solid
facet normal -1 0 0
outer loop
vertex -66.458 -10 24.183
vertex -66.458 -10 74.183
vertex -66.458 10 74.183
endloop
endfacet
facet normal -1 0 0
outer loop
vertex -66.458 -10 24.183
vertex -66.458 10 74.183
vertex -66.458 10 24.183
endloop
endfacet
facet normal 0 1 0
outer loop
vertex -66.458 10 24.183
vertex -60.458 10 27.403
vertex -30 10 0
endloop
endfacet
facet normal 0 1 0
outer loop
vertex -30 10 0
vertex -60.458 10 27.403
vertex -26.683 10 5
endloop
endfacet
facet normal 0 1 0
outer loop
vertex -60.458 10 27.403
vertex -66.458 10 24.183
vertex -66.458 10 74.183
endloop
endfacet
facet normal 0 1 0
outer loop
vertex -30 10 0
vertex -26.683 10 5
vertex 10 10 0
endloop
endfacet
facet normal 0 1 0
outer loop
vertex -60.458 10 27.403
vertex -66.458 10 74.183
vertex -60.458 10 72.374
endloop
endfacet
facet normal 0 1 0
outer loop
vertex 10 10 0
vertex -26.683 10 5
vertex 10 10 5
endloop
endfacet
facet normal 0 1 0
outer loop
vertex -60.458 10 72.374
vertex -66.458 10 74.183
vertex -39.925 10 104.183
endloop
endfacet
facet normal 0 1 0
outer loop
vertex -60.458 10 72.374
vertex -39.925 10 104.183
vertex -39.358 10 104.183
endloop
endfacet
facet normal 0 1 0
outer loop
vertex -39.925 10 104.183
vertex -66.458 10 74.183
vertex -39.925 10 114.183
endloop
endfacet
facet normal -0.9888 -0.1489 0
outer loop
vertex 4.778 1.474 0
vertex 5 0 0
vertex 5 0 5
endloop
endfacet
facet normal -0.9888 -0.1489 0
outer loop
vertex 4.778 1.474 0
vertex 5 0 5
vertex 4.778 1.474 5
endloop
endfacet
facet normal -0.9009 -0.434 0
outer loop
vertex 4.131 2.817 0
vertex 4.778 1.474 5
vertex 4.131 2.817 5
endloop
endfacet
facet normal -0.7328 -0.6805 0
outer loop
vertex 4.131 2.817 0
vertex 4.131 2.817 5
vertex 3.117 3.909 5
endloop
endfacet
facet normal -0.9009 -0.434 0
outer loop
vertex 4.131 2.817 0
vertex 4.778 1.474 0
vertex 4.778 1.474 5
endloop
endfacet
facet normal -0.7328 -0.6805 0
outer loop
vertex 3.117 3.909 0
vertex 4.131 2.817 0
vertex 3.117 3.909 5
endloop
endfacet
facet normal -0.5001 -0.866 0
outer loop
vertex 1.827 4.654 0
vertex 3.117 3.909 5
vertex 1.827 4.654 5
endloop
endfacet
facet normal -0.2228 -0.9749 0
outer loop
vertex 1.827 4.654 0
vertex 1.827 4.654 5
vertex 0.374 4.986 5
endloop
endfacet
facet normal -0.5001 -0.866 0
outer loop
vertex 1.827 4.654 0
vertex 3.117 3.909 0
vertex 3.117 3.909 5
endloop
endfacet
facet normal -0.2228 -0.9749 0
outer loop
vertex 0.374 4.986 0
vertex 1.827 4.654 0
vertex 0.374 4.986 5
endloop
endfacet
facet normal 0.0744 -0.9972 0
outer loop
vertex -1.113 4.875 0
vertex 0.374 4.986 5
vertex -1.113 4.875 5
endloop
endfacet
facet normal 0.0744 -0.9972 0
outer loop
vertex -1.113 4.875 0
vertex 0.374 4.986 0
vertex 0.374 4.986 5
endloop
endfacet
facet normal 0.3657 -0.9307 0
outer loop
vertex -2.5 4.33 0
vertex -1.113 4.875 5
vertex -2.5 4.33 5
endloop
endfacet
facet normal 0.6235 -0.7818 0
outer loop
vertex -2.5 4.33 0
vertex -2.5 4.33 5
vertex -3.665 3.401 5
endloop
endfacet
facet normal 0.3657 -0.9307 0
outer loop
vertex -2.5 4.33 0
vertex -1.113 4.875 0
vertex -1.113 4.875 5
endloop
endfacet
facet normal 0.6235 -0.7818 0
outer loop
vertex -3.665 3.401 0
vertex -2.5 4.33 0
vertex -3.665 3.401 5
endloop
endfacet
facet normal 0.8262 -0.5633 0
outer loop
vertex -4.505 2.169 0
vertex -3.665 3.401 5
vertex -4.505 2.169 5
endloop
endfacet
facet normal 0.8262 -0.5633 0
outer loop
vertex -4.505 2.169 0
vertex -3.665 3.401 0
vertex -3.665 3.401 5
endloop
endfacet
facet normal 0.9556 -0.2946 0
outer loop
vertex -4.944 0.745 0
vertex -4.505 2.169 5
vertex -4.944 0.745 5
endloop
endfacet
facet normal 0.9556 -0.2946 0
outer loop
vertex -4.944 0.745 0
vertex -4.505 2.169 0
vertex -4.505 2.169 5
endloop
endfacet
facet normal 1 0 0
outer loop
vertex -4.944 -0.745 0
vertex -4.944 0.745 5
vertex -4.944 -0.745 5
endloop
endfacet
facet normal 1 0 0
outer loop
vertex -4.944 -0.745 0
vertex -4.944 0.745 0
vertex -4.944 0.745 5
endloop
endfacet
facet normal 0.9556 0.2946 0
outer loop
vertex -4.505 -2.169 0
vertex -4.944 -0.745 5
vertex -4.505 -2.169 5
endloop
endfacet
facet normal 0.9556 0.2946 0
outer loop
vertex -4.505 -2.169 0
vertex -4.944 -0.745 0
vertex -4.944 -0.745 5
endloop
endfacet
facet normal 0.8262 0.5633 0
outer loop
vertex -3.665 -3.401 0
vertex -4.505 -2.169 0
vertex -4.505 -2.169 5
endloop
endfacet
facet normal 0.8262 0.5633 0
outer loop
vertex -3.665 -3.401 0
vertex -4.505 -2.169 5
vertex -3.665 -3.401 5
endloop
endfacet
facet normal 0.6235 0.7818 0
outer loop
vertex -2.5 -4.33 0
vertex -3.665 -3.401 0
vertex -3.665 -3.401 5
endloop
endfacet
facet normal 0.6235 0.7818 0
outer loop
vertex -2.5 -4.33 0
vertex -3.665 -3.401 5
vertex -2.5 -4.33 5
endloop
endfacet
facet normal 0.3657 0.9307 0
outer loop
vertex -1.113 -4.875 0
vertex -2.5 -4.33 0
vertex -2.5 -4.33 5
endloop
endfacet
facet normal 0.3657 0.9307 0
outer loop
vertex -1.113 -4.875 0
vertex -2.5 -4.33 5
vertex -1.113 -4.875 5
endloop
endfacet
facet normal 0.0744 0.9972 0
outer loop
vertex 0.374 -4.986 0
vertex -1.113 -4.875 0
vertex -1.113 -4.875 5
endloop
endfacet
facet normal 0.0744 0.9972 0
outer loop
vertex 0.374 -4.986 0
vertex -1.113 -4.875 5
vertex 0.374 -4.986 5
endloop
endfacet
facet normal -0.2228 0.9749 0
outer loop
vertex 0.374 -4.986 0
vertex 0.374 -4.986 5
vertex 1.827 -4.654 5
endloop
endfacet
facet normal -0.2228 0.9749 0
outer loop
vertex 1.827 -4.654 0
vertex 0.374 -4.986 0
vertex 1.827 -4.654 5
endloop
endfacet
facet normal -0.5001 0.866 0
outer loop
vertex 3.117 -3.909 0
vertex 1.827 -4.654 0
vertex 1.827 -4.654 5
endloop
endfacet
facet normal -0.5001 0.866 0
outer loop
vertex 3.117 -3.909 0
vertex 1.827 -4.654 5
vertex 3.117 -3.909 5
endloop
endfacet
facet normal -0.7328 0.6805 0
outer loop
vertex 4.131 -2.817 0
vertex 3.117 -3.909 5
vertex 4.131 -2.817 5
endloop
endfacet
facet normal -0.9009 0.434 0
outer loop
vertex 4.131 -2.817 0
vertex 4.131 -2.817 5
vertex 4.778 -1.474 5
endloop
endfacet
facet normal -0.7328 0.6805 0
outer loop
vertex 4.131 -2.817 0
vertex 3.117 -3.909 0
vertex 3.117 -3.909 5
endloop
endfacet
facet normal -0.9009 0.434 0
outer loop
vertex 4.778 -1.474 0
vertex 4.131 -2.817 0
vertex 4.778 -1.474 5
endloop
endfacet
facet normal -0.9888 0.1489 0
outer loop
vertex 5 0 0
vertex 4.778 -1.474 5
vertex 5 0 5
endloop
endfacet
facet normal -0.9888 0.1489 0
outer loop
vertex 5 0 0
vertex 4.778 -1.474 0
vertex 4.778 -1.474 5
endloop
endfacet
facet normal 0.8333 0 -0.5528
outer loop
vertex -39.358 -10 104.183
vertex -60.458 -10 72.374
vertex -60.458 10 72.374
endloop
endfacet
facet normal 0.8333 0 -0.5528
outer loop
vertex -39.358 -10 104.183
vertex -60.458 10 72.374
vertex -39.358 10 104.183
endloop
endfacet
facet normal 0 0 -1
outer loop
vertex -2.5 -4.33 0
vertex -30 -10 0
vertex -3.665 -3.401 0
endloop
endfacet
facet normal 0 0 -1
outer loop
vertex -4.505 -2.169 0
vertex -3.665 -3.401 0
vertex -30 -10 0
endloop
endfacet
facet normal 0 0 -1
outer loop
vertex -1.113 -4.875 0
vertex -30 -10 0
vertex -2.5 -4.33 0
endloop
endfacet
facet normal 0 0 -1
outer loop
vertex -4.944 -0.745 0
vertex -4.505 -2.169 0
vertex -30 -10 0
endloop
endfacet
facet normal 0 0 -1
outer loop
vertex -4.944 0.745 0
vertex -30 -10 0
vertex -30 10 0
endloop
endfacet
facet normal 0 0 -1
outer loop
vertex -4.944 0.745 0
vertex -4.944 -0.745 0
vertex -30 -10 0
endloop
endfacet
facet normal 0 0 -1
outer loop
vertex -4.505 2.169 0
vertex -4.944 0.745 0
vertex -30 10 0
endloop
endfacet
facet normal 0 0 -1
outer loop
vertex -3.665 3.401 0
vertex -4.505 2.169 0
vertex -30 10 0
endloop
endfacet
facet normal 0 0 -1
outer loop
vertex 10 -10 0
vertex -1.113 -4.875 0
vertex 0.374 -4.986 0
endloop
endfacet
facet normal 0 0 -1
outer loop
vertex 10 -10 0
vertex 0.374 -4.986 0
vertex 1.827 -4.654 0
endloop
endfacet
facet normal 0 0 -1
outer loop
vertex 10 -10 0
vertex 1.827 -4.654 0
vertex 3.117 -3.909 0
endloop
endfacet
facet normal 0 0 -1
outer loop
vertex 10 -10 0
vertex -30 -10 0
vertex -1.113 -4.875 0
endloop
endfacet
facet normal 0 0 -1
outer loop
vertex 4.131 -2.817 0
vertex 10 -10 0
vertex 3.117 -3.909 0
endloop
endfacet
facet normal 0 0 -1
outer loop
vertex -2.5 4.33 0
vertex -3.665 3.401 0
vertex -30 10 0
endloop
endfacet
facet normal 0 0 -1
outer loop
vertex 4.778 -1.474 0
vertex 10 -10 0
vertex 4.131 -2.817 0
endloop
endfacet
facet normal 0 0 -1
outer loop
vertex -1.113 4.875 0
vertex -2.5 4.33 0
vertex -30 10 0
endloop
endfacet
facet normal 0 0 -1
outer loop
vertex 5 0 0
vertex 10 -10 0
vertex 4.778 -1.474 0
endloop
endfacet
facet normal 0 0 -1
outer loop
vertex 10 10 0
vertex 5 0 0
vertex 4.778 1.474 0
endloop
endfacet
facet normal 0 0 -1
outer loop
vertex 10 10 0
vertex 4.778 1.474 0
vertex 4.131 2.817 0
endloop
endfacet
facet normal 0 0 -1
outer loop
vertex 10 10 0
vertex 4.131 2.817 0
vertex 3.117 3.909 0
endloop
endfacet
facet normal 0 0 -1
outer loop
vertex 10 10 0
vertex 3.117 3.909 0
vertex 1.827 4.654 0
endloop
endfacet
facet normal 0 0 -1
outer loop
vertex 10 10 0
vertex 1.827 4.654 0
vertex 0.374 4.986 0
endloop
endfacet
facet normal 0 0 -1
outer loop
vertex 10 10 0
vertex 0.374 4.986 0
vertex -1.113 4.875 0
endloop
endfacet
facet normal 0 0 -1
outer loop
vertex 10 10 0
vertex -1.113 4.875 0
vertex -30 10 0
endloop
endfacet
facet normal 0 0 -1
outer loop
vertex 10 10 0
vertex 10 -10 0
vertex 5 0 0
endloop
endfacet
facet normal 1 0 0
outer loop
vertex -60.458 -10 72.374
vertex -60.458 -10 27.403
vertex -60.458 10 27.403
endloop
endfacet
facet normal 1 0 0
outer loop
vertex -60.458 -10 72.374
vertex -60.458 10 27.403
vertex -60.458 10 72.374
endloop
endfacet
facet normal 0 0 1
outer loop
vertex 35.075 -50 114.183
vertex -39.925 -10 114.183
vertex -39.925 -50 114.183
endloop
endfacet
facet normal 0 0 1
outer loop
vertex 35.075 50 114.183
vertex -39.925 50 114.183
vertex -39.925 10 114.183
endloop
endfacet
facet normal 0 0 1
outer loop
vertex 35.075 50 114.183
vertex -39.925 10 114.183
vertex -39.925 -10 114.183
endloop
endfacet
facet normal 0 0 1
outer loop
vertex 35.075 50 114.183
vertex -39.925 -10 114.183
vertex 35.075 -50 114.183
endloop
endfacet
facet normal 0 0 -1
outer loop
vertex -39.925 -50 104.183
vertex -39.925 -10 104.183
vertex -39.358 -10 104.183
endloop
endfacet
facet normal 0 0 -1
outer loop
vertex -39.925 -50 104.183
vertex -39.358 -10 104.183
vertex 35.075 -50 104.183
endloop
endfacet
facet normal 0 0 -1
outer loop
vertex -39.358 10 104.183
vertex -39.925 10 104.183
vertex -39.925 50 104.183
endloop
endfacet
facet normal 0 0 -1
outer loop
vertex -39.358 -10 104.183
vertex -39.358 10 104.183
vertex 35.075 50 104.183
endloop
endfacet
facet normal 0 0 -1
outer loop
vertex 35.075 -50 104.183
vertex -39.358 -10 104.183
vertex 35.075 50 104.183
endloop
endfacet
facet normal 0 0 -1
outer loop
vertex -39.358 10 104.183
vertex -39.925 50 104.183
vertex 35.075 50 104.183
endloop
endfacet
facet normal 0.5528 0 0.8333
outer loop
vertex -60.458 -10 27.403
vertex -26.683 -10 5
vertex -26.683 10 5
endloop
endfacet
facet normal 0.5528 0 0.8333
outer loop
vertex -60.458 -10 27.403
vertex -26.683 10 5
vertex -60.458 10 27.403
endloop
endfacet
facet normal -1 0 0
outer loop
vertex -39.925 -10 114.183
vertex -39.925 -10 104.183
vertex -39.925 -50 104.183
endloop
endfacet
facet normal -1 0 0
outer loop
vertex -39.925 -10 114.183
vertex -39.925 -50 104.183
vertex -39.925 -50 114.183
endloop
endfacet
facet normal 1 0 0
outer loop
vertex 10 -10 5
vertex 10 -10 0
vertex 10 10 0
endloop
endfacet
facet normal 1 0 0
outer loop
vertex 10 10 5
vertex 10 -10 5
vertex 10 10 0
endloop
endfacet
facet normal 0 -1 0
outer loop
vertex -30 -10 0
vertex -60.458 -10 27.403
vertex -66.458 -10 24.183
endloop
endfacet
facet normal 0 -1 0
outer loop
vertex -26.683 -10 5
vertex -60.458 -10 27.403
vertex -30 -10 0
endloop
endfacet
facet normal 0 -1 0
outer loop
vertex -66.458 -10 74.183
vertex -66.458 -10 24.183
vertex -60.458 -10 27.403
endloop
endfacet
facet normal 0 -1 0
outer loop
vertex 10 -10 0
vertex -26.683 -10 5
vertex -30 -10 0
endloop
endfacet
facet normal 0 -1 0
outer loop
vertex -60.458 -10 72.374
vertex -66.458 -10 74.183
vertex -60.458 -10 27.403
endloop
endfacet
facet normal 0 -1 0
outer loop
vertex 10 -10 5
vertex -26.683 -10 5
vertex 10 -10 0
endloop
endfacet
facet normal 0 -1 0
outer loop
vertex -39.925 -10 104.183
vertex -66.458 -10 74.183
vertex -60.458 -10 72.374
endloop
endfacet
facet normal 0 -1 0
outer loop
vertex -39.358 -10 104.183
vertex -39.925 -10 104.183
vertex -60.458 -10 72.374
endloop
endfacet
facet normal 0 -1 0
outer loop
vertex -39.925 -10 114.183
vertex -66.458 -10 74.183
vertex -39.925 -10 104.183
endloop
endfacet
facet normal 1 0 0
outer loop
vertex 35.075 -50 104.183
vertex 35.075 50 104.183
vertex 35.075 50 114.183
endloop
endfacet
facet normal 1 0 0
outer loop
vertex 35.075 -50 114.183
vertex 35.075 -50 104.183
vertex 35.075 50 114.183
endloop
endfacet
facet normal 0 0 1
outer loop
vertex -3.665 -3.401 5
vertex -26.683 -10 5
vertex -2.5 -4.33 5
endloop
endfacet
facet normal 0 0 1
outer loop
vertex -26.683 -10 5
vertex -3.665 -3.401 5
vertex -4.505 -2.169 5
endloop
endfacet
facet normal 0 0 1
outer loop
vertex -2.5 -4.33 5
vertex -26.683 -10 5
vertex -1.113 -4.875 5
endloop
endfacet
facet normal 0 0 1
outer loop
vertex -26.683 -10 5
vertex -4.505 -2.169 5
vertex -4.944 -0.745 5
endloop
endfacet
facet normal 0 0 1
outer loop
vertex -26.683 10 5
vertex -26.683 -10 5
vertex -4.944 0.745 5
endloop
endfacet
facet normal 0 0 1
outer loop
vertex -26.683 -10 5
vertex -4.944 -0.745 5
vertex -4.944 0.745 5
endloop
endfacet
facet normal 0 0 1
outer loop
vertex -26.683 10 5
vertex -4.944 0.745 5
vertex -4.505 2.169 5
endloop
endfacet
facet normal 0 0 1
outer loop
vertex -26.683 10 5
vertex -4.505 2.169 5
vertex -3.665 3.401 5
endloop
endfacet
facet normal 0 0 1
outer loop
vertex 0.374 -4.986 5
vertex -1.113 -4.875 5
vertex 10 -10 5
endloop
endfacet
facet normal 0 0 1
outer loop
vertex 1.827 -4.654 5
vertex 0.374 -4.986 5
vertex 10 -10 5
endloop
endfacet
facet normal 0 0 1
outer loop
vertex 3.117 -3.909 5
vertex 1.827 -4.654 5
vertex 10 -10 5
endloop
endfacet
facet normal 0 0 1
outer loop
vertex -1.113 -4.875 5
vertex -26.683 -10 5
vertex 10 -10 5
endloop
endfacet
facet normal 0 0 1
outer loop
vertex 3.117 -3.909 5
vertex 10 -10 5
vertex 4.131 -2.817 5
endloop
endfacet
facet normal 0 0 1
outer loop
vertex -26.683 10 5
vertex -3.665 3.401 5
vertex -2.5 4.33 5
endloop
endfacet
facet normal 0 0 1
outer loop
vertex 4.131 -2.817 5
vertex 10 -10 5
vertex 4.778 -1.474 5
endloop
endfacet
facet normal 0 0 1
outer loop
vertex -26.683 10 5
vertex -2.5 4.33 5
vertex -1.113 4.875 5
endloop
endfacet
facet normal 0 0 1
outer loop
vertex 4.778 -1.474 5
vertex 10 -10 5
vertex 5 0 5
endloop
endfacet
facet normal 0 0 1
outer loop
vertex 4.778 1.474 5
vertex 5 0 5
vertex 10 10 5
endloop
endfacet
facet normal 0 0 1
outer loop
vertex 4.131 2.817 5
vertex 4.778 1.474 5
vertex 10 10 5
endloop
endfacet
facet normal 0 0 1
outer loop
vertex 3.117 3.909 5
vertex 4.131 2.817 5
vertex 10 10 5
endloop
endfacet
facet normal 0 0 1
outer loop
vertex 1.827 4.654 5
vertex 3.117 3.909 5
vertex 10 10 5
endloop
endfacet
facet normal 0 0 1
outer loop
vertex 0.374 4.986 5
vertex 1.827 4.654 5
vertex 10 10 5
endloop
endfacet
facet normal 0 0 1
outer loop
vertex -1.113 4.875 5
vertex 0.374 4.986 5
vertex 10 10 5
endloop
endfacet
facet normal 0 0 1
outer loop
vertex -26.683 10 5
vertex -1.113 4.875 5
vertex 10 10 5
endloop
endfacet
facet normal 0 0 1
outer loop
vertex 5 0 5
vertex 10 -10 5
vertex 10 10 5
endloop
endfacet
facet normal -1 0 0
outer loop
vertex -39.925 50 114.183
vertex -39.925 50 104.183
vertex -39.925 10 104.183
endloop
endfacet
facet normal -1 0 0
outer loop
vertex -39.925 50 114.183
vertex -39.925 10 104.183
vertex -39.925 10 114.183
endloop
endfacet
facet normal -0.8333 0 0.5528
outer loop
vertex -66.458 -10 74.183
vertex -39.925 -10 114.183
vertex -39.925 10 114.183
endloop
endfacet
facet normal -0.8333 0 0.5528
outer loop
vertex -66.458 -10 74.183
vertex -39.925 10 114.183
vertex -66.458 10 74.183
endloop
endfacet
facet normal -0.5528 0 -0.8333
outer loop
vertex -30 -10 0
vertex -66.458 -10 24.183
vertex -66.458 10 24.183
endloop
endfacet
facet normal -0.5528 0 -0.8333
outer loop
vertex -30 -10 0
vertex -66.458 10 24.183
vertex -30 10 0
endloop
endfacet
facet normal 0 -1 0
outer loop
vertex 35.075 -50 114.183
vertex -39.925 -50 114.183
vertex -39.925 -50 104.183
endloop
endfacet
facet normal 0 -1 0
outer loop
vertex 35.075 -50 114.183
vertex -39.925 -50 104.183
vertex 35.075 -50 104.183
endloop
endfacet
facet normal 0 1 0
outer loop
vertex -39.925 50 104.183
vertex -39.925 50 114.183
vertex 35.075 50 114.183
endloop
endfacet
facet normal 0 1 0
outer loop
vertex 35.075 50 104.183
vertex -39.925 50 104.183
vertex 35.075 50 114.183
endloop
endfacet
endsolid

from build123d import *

# Parameters (mm, degrees)
SKETCH1_W                = 20
SKETCH1_H                = 20
SKETCH1_R                = 5
BOSS_EXTRUDE1_DEPTH      = 5
SKETCH2_W                = 5
SKETCH2_H                = 20
BOSS_EXTRUDE2_DEPTH      = 20
BOSS_EXTRUDE6_DEPTH      = 20
BOSS_EXTRUDE7_DEPTH      = 40
BOSS_EXTRUDE7_DEPTH_BACK = 60
SKETCH9_W                = 75
SKETCH9_H                = 10


with BuildPart() as part:
    # Sketch1 → Boss-Extrude1 (new body)
    with BuildSketch(Plane.XY):
        Rectangle(SKETCH1_W, SKETCH1_H)
        Circle(SKETCH1_R, mode=Mode.SUBTRACT)
    extrude(amount=BOSS_EXTRUDE1_DEPTH)

    # Sketch2 → Boss-Extrude2 (add)
    with BuildSketch(Plane.ZY.offset(10)):
        with Locations((2.5, 0)):
            Rectangle(SKETCH2_W, SKETCH2_H)
    extrude(amount=BOSS_EXTRUDE2_DEPTH)

    # Sketch8 → Boss-Extrude6 (add)
    with BuildSketch(Plane.XZ.offset(10)):
        Polygon((35.075402168, 114.183233441), (-39.924597832, 114.183233441), (-34.924597832, 110.86660865), (-39.357847412, 104.183233441), (35.075402168, 104.183233441), align=None)
        Polygon((-34.924597832, 110.86660865), (-39.924597832, 114.183233441), (-39.924597832, 104.183233441), (-39.357847412, 104.183233441), align=None)
        Polygon((-39.924597832, 114.183233441), (-66.457596155, 74.183233441), (-60.457596155, 74.183233441), (-60.457596155, 72.374165373), (-39.357847412, 104.183233441), (-39.924597832, 104.183233441), align=None)
        Polygon((-60.457596155, 74.183233441), (-66.457596155, 74.183233441), (-61.457596155, 70.86660865), (-60.457596155, 72.374165373), align=None)
        Polygon((-66.457596155, 74.183233441), (-66.457596155, 24.183233441), (-63.140971364, 29.183233441), (-60.457596155, 27.403283692), (-60.457596155, 72.374165373), (-61.457596155, 70.86660865), align=None)
        Polygon((-63.140971364, 29.183233441), (-66.457596155, 24.183233441), (-60.457596155, 24.183233441), (-60.457596155, 27.403283692), align=None)
        Polygon((-66.457596155, 24.183233441), (-30, 0), (-30, 5), (-26.68337521, 5), (-60.457596155, 27.403283692), (-60.457596155, 24.183233441), align=None)
    extrude(amount=-BOSS_EXTRUDE6_DEPTH)

    # Sketch9 → Boss-Extrude7 (add, two sides: drawn at the far end of the back side and taken through both)
    with BuildSketch(Plane.XZ.offset(10).offset(-BOSS_EXTRUDE7_DEPTH_BACK)):
        with Locations((-2.424597832, 109.183233441)):
            Rectangle(SKETCH9_W, SKETCH9_H)
    extrude(amount=BOSS_EXTRUDE7_DEPTH + BOSS_EXTRUDE7_DEPTH_BACK)


solid = part.part
